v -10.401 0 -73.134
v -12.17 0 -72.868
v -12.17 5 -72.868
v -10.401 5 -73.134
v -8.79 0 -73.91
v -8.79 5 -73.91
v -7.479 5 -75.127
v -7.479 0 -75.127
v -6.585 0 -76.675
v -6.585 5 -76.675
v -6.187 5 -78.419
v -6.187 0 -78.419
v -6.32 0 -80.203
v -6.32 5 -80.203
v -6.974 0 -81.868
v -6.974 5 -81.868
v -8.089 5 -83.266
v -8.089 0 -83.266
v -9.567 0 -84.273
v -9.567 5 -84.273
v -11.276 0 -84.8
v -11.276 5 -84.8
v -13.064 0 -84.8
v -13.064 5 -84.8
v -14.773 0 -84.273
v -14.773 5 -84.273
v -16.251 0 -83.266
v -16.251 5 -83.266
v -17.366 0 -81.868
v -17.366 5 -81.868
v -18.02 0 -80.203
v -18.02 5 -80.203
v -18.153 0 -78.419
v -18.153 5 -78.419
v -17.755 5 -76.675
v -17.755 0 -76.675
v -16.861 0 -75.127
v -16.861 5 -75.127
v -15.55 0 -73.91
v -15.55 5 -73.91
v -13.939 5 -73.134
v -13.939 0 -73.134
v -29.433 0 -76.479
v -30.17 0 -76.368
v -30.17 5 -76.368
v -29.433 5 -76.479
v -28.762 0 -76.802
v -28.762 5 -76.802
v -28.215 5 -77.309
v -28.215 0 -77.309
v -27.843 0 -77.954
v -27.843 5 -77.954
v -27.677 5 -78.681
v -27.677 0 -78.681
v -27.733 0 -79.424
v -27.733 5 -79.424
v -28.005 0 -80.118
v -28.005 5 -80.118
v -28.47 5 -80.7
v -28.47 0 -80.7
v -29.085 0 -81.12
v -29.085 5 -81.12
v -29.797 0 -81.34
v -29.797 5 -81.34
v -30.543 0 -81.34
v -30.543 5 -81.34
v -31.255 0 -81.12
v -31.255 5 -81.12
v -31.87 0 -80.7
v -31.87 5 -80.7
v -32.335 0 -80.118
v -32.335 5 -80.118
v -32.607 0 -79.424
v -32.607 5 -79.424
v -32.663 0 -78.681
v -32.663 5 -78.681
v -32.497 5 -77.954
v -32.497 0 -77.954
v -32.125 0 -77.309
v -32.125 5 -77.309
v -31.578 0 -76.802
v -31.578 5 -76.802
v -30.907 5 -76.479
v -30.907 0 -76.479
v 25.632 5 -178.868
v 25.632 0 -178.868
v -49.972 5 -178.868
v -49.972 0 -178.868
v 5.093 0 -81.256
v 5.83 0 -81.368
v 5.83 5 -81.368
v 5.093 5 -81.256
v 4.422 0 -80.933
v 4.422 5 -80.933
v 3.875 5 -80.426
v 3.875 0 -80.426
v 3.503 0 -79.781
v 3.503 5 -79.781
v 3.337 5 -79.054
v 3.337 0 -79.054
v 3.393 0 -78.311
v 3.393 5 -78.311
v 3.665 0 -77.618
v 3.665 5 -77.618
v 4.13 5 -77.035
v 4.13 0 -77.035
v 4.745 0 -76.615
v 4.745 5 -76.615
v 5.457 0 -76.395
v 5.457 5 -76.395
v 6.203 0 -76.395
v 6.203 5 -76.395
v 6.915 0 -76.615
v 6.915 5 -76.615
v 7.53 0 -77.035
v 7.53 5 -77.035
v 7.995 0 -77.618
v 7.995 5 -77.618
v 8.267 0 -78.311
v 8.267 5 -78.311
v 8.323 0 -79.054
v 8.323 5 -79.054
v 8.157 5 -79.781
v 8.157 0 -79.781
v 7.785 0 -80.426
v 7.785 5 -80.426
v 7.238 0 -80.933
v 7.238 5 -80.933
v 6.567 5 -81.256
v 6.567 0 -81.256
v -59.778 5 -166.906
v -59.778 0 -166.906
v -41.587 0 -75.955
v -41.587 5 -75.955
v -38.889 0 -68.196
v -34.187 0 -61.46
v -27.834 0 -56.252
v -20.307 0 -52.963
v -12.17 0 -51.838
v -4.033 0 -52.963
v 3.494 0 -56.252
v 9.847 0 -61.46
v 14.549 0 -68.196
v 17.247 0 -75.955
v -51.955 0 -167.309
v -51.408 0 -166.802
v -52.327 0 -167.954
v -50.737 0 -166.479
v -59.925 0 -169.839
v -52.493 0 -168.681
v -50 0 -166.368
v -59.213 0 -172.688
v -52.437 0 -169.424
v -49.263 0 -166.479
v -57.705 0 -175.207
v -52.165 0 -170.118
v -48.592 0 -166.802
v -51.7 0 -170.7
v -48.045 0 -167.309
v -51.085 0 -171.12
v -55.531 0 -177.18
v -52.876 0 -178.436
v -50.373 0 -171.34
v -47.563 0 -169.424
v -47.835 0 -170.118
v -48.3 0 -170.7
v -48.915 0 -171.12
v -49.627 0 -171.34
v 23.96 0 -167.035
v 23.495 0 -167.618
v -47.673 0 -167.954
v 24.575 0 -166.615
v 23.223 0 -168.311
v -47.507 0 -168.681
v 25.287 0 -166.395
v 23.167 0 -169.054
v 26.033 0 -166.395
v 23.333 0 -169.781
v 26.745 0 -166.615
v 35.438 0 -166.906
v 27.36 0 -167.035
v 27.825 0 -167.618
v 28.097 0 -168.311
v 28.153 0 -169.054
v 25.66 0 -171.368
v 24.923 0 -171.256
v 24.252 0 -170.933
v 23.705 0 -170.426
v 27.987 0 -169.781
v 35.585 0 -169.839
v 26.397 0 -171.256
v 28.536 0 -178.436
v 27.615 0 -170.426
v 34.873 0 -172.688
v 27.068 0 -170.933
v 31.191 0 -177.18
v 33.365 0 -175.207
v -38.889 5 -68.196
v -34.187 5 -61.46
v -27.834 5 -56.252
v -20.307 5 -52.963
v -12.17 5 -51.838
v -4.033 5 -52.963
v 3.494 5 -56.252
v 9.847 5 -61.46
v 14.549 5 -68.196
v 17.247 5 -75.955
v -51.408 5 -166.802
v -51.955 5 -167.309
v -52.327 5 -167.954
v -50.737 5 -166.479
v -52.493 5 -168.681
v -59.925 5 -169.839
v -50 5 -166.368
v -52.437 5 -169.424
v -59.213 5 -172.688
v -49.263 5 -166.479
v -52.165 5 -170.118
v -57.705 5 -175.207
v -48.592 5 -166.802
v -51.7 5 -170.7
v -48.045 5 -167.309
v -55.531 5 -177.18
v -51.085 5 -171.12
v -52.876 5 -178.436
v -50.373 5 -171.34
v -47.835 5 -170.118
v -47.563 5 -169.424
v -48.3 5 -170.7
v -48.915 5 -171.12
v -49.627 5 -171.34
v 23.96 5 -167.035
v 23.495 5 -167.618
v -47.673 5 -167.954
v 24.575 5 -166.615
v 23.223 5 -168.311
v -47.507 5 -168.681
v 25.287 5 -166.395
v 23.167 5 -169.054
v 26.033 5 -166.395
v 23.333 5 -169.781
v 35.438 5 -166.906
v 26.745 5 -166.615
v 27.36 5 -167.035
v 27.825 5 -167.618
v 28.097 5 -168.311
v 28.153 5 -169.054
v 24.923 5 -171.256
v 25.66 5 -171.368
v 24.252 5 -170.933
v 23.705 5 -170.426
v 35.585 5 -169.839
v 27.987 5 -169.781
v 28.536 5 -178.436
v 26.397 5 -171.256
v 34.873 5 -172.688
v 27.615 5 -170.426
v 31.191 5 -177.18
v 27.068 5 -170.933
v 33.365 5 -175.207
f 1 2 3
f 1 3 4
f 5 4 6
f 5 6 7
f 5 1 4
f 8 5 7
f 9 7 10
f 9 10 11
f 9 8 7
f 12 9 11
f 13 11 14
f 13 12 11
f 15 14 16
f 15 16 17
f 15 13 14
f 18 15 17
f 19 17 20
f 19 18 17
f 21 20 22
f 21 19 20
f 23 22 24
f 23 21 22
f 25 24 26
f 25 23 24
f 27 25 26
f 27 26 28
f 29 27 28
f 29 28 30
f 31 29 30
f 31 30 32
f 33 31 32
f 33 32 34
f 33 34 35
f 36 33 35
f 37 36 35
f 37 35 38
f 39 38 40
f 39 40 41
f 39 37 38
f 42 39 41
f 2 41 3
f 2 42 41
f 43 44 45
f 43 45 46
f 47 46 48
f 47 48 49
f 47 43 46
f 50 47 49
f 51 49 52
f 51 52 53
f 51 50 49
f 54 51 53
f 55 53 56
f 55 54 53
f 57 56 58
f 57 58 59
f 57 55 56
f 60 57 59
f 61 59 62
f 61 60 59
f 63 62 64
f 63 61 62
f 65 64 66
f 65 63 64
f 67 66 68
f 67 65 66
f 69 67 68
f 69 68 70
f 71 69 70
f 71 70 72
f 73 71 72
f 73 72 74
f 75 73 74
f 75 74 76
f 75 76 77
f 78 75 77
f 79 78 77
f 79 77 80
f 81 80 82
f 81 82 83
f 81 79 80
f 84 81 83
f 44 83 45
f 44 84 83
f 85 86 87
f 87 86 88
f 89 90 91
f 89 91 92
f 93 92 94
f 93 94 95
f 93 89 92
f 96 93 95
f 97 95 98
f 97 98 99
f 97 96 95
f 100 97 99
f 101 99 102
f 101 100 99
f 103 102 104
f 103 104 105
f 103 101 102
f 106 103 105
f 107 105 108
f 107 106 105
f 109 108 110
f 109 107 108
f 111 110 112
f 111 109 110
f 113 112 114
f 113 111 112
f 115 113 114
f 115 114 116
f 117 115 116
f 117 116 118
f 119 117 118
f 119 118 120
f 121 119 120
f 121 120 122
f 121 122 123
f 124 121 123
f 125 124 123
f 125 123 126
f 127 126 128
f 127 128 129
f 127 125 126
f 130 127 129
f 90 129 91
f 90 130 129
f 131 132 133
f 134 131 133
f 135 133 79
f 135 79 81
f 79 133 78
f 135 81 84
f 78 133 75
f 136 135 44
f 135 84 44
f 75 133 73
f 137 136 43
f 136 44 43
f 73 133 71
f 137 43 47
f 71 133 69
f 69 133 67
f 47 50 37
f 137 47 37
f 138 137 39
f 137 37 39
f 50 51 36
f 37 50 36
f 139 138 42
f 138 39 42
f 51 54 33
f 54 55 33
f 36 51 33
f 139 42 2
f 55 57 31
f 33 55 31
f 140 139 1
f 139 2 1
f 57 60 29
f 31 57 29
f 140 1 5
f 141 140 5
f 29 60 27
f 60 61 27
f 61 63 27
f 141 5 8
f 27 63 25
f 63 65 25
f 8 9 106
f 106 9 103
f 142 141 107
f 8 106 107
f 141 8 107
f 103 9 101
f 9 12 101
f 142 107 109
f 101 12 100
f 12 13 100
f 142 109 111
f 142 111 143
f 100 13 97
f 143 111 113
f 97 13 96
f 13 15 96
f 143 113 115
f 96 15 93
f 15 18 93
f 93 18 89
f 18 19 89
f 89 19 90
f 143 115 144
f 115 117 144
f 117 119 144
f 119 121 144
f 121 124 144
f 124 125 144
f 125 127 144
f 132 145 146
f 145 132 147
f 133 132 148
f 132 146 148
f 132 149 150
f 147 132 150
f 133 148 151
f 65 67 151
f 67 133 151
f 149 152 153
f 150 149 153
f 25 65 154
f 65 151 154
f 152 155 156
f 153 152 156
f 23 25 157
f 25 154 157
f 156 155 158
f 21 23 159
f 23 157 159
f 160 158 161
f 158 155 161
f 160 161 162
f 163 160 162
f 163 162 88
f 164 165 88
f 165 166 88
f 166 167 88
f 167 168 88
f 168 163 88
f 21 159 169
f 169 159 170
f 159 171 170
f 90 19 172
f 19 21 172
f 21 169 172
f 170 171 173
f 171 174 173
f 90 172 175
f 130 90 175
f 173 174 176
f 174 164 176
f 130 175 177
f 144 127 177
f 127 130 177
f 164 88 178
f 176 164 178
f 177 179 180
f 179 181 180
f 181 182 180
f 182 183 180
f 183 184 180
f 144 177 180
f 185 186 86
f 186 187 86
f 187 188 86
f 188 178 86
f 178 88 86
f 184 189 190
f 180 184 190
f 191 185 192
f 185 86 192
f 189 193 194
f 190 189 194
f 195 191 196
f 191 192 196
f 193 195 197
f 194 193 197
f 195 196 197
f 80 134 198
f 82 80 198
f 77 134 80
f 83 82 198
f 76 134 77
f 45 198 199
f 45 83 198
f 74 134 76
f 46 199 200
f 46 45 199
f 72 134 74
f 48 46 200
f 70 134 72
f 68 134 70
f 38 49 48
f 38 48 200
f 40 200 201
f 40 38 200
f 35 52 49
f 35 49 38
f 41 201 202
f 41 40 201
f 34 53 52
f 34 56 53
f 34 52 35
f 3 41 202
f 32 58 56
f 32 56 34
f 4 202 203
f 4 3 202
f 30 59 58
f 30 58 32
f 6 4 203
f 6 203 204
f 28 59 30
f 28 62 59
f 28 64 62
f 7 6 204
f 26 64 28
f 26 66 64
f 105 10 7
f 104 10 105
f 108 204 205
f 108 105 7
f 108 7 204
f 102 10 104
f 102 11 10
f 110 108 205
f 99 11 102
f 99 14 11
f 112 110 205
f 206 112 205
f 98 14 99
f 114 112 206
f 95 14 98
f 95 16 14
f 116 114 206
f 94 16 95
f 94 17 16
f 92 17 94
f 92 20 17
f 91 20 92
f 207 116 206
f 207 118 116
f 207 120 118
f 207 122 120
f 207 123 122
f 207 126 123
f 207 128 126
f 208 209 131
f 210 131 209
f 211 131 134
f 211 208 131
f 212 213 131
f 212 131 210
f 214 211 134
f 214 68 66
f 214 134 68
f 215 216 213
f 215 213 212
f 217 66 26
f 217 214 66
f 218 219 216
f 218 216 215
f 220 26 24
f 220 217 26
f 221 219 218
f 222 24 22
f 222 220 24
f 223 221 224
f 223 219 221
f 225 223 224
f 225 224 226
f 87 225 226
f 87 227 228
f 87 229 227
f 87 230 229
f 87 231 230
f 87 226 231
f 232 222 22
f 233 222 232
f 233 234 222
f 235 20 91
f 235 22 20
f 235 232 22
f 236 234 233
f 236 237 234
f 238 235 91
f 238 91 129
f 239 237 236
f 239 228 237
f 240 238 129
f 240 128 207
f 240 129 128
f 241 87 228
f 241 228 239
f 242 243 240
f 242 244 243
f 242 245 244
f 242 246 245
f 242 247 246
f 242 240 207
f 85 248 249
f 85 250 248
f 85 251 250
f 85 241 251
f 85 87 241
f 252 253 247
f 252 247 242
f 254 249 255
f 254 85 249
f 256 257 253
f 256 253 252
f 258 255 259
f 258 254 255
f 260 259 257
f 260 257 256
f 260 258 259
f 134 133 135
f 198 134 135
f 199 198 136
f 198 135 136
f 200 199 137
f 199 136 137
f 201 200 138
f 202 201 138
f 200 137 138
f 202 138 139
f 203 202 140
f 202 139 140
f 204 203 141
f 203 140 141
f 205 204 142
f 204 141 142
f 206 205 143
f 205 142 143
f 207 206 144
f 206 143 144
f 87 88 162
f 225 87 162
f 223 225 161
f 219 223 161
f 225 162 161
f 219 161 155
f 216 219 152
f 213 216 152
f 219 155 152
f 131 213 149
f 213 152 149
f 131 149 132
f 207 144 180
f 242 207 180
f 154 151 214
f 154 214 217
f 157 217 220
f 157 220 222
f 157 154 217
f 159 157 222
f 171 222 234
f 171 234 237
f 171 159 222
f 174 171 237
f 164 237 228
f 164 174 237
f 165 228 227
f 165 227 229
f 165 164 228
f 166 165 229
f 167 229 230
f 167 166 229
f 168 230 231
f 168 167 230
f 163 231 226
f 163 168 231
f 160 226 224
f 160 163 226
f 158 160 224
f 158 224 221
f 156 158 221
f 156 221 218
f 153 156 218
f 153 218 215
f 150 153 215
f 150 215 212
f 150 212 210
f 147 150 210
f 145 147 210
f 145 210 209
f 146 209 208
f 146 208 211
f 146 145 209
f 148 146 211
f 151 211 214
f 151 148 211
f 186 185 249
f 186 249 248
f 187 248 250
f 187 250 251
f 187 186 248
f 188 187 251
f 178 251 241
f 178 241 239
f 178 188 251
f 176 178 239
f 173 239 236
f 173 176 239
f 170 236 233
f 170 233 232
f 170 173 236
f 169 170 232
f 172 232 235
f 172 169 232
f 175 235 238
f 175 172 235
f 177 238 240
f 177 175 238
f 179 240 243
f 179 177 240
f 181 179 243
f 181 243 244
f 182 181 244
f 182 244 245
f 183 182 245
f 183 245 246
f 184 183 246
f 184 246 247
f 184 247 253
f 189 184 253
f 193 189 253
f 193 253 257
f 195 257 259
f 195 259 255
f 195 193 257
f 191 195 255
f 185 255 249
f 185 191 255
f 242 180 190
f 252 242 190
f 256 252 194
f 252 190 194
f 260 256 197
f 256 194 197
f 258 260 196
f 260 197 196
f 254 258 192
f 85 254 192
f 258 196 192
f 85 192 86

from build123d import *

# Parameters (mm, degrees)
SKETCH_2_R      = 2.5
SKETCH_2_R_2    = 6
EXTRUDE_1_DEPTH = 5


with BuildPart() as part:
    # 草图2 → 凸台-拉伸1 (new body)
    with BuildSketch(Plane(origin=(0, 0, 0), x_dir=(1, 0, 0), z_dir=(0, 1, 0))):
        with BuildLine():
            Line((25.631960973, 178.867513459), (-49.971960973, 178.867513459))
            ThreePointArc((-49.971960973, 178.867513459), (-57.705382386, 175.207402516), (-59.77776773, 166.906352108))
            Line((-59.77776773, 166.906352108), (-41.587420271, 75.954614813))
            ThreePointArc((-41.587420271, 75.954614813), (-12.17, 51.838098867), (17.247420271, 75.954614813))
            Line((17.247420271, 75.954614813), (35.43776773, 166.906352108))
            ThreePointArc((35.43776773, 166.906352108), (33.365382386, 175.207402516), (25.631960973, 178.867513459))
        make_face()
        with Locations(Location((-30.17, 78.867513459, 0), (0, 0, 270))):
            Circle(SKETCH_2_R, mode=Mode.SUBTRACT)
        with Locations(Location((5.83, 78.867513459, 0), (0, 0, 90))):
            Circle(SKETCH_2_R, mode=Mode.SUBTRACT)
        with Locations(Location((-50, 168.867513459, 0), (0, 0, 270))):
            Circle(SKETCH_2_R, mode=Mode.SUBTRACT)
        with Locations(Location((25.66, 168.867513459, 0), (0, 0, 90))):
            Circle(SKETCH_2_R, mode=Mode.SUBTRACT)
        with Locations(Location((-12.17, 78.867513459, 0), (0, 0, 270))):
            Circle(SKETCH_2_R_2, mode=Mode.SUBTRACT)
    extrude(amount=EXTRUDE_1_DEPTH)


solid = part.part
